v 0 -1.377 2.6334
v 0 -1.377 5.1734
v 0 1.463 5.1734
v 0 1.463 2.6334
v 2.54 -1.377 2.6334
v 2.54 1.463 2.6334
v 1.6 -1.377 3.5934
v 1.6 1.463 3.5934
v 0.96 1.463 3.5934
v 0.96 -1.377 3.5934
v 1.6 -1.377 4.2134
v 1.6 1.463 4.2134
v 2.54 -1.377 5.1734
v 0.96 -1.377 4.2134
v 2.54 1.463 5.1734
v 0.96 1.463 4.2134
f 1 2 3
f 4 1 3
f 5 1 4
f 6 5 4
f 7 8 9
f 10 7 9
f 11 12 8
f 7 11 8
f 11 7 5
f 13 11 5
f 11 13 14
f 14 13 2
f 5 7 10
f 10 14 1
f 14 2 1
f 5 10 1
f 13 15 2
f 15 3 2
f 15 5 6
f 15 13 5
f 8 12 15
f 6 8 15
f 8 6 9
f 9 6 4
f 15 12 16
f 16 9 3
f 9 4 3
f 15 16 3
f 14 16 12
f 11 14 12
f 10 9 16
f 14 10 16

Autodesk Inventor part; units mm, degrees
ref_plane "YZ Plane" through (0, 0, 0) normal (1, 0, 0) x (0, 1, 0)
ref_plane "XZ Plane" through (0, 0, 0) normal (0, 1, 0) x (-1, 0, 0)
ref_plane "XY Plane" through (0, 0, 0) normal (0, 0, 1) x (1, 0, 0)
sketch "Sketch1" plane through (0, 0, 0) normal (1, 0, 0) x (0, 1, 0)
  line L0 (1.463, 5.1734) -> (-1.377, 5.1734)
  line L1 (-1.377, 5.1734) -> (-1.377, 2.6334)
  line L2 (-1.377, 2.6334) -> (1.463, 2.6334)
  line L3 (1.463, 2.6334) -> (1.463, 5.1734)
  point P0 (0, 0)
  dimension "d0" = 2.54
  dimension "d1" = 2.84
extrude "Extrusion1" add sketch "Sketch1" along normal blind 2.54
sketch "Sketch2" plane through (0, 1.463, 5.1734) normal (0, 1, 0) x (1, 0, 0)
  line L0 (0.96, 0.96) -> (1.6, 0.96)
  line L1 (1.6, 0.96) -> (1.6, 1.58)
  line L2 (1.6, 1.58) -> (0.96, 1.58)
  line L3 (0.96, 1.58) -> (0.96, 0.96)
  line L4 (0, 0) -> (2.54, 0) projected
  line L5 (0, 2.54) -> (2.54, 2.54) projected
  line L6 (0, 2.54) -> (0, 0) projected
  line L7 (2.54, 2.54) -> (2.54, 0) projected
  line L8 (2.54, 0) -> (2.54, 2.54) projected
  point P0 (0, 5.1734)
  dimension "d4" = 0.62
  dimension "d5" = 0.64
  dimension "d6" = 0.96
  dimension "d7" = 0.96
  dimension "d8" = 0.96
  dimension "d9" = 0.94
extrude "Extrusion2" cut sketch "Sketch2" against normal blind 3.81 contours L3 L2 L1 L0
properties part number "HeaderBlock"
